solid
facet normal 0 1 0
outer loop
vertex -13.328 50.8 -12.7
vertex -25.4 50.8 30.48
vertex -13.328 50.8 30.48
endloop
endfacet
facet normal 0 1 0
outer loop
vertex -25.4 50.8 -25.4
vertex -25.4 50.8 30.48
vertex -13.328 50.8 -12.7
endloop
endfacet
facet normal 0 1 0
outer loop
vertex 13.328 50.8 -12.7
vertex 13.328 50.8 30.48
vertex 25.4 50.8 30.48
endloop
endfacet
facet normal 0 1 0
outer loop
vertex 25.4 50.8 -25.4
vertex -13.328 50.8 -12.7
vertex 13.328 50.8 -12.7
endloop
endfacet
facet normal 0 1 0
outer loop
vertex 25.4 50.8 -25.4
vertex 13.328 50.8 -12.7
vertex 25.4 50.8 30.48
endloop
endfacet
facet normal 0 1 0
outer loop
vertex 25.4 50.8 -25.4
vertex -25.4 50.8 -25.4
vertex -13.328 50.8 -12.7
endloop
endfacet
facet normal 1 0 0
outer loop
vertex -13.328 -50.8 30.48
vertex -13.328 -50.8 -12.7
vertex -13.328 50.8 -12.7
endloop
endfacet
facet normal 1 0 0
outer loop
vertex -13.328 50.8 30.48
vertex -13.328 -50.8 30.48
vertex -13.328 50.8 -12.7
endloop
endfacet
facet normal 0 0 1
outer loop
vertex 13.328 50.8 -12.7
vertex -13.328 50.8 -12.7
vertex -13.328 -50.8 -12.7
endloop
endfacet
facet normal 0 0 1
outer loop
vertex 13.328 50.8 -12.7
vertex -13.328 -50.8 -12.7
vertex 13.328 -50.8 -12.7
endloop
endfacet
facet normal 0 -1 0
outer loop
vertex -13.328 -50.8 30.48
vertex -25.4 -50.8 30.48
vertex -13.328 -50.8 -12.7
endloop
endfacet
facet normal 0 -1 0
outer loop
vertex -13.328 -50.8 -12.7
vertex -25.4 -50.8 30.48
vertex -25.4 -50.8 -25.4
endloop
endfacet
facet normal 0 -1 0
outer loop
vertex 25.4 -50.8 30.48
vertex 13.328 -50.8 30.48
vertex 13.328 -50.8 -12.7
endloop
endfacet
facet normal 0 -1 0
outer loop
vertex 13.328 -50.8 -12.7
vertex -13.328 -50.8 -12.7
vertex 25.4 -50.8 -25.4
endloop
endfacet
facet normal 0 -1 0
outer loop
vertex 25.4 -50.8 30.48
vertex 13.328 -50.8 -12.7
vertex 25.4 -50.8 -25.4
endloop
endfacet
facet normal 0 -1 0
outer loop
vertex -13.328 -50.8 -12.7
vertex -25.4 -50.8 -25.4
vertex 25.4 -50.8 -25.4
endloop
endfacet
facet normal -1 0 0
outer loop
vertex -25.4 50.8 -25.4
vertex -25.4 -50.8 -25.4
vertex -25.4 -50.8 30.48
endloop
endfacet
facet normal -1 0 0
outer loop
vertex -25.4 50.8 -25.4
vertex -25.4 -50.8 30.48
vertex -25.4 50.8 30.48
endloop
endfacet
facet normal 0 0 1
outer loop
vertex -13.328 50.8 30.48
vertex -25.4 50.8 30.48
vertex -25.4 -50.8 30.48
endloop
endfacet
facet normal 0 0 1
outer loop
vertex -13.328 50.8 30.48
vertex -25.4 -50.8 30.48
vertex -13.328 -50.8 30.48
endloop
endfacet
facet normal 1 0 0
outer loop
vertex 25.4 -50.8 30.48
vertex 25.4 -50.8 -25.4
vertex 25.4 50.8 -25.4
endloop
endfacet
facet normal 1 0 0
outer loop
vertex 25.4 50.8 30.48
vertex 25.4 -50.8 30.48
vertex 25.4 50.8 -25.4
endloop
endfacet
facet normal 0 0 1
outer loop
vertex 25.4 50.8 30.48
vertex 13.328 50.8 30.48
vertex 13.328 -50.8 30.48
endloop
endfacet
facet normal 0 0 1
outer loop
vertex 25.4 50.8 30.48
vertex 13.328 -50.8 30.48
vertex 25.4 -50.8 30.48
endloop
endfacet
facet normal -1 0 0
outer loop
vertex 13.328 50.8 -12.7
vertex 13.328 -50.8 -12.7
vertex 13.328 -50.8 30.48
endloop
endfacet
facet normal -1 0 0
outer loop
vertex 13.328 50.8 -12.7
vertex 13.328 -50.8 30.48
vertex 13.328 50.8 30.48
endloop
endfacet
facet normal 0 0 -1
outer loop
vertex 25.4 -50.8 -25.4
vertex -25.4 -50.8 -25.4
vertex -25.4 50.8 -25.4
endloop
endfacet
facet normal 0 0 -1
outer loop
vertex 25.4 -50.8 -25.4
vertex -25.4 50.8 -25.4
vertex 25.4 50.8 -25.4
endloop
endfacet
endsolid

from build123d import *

# Parameters (mm, degrees)
F0_W     = 50.8
F0_H     = 101.6
F1_DEPTH = 25.4
F2_W     = 26.6550015658
F2_H     = 101.6
F3_DEPTH = 38.1
F4_DEPTH = 25.4
F5_DEPTH = 25.4
F6_DEPTH = 20.32


with BuildPart() as f1:
    # F0 (on Top) → F1 (new body, symmetric)
    with BuildSketch(Plane.XY):
        Rectangle(F0_W, F0_H)
    extrude(amount=F1_DEPTH, both=True)

    # F2 (on face) → F3 (cut)
    with BuildSketch(Plane.XY.offset(25.4)):
        Rectangle(F2_W, F2_H)
    extrude(amount=-F3_DEPTH, mode=Mode.SUBTRACT)

    # F4 (add): a face of the model
    f4_faces = [f1.faces().sort_by_distance(p)[0] for p in [
        (-19.3637503915, 0, 25.4),
    ]]
    extrude(f4_faces, amount=F4_DEPTH)

    # F5 (add): a face of the model
    f5_faces = [f1.faces().sort_by_distance(p)[0] for p in [
        (19.3637503915, 0, 25.4),
    ]]
    extrude(f5_faces, amount=F5_DEPTH)

    # F6 (cut): faces of the model
    f6_faces = [f1.faces().sort_by_distance(p)[0] for p in [
        (19.3637503915, 0, 50.8),
        (-19.3637503915, 0, 50.8),
    ]]
    extrude(f6_faces, amount=-F6_DEPTH, mode=Mode.SUBTRACT)


solid = f1.part
